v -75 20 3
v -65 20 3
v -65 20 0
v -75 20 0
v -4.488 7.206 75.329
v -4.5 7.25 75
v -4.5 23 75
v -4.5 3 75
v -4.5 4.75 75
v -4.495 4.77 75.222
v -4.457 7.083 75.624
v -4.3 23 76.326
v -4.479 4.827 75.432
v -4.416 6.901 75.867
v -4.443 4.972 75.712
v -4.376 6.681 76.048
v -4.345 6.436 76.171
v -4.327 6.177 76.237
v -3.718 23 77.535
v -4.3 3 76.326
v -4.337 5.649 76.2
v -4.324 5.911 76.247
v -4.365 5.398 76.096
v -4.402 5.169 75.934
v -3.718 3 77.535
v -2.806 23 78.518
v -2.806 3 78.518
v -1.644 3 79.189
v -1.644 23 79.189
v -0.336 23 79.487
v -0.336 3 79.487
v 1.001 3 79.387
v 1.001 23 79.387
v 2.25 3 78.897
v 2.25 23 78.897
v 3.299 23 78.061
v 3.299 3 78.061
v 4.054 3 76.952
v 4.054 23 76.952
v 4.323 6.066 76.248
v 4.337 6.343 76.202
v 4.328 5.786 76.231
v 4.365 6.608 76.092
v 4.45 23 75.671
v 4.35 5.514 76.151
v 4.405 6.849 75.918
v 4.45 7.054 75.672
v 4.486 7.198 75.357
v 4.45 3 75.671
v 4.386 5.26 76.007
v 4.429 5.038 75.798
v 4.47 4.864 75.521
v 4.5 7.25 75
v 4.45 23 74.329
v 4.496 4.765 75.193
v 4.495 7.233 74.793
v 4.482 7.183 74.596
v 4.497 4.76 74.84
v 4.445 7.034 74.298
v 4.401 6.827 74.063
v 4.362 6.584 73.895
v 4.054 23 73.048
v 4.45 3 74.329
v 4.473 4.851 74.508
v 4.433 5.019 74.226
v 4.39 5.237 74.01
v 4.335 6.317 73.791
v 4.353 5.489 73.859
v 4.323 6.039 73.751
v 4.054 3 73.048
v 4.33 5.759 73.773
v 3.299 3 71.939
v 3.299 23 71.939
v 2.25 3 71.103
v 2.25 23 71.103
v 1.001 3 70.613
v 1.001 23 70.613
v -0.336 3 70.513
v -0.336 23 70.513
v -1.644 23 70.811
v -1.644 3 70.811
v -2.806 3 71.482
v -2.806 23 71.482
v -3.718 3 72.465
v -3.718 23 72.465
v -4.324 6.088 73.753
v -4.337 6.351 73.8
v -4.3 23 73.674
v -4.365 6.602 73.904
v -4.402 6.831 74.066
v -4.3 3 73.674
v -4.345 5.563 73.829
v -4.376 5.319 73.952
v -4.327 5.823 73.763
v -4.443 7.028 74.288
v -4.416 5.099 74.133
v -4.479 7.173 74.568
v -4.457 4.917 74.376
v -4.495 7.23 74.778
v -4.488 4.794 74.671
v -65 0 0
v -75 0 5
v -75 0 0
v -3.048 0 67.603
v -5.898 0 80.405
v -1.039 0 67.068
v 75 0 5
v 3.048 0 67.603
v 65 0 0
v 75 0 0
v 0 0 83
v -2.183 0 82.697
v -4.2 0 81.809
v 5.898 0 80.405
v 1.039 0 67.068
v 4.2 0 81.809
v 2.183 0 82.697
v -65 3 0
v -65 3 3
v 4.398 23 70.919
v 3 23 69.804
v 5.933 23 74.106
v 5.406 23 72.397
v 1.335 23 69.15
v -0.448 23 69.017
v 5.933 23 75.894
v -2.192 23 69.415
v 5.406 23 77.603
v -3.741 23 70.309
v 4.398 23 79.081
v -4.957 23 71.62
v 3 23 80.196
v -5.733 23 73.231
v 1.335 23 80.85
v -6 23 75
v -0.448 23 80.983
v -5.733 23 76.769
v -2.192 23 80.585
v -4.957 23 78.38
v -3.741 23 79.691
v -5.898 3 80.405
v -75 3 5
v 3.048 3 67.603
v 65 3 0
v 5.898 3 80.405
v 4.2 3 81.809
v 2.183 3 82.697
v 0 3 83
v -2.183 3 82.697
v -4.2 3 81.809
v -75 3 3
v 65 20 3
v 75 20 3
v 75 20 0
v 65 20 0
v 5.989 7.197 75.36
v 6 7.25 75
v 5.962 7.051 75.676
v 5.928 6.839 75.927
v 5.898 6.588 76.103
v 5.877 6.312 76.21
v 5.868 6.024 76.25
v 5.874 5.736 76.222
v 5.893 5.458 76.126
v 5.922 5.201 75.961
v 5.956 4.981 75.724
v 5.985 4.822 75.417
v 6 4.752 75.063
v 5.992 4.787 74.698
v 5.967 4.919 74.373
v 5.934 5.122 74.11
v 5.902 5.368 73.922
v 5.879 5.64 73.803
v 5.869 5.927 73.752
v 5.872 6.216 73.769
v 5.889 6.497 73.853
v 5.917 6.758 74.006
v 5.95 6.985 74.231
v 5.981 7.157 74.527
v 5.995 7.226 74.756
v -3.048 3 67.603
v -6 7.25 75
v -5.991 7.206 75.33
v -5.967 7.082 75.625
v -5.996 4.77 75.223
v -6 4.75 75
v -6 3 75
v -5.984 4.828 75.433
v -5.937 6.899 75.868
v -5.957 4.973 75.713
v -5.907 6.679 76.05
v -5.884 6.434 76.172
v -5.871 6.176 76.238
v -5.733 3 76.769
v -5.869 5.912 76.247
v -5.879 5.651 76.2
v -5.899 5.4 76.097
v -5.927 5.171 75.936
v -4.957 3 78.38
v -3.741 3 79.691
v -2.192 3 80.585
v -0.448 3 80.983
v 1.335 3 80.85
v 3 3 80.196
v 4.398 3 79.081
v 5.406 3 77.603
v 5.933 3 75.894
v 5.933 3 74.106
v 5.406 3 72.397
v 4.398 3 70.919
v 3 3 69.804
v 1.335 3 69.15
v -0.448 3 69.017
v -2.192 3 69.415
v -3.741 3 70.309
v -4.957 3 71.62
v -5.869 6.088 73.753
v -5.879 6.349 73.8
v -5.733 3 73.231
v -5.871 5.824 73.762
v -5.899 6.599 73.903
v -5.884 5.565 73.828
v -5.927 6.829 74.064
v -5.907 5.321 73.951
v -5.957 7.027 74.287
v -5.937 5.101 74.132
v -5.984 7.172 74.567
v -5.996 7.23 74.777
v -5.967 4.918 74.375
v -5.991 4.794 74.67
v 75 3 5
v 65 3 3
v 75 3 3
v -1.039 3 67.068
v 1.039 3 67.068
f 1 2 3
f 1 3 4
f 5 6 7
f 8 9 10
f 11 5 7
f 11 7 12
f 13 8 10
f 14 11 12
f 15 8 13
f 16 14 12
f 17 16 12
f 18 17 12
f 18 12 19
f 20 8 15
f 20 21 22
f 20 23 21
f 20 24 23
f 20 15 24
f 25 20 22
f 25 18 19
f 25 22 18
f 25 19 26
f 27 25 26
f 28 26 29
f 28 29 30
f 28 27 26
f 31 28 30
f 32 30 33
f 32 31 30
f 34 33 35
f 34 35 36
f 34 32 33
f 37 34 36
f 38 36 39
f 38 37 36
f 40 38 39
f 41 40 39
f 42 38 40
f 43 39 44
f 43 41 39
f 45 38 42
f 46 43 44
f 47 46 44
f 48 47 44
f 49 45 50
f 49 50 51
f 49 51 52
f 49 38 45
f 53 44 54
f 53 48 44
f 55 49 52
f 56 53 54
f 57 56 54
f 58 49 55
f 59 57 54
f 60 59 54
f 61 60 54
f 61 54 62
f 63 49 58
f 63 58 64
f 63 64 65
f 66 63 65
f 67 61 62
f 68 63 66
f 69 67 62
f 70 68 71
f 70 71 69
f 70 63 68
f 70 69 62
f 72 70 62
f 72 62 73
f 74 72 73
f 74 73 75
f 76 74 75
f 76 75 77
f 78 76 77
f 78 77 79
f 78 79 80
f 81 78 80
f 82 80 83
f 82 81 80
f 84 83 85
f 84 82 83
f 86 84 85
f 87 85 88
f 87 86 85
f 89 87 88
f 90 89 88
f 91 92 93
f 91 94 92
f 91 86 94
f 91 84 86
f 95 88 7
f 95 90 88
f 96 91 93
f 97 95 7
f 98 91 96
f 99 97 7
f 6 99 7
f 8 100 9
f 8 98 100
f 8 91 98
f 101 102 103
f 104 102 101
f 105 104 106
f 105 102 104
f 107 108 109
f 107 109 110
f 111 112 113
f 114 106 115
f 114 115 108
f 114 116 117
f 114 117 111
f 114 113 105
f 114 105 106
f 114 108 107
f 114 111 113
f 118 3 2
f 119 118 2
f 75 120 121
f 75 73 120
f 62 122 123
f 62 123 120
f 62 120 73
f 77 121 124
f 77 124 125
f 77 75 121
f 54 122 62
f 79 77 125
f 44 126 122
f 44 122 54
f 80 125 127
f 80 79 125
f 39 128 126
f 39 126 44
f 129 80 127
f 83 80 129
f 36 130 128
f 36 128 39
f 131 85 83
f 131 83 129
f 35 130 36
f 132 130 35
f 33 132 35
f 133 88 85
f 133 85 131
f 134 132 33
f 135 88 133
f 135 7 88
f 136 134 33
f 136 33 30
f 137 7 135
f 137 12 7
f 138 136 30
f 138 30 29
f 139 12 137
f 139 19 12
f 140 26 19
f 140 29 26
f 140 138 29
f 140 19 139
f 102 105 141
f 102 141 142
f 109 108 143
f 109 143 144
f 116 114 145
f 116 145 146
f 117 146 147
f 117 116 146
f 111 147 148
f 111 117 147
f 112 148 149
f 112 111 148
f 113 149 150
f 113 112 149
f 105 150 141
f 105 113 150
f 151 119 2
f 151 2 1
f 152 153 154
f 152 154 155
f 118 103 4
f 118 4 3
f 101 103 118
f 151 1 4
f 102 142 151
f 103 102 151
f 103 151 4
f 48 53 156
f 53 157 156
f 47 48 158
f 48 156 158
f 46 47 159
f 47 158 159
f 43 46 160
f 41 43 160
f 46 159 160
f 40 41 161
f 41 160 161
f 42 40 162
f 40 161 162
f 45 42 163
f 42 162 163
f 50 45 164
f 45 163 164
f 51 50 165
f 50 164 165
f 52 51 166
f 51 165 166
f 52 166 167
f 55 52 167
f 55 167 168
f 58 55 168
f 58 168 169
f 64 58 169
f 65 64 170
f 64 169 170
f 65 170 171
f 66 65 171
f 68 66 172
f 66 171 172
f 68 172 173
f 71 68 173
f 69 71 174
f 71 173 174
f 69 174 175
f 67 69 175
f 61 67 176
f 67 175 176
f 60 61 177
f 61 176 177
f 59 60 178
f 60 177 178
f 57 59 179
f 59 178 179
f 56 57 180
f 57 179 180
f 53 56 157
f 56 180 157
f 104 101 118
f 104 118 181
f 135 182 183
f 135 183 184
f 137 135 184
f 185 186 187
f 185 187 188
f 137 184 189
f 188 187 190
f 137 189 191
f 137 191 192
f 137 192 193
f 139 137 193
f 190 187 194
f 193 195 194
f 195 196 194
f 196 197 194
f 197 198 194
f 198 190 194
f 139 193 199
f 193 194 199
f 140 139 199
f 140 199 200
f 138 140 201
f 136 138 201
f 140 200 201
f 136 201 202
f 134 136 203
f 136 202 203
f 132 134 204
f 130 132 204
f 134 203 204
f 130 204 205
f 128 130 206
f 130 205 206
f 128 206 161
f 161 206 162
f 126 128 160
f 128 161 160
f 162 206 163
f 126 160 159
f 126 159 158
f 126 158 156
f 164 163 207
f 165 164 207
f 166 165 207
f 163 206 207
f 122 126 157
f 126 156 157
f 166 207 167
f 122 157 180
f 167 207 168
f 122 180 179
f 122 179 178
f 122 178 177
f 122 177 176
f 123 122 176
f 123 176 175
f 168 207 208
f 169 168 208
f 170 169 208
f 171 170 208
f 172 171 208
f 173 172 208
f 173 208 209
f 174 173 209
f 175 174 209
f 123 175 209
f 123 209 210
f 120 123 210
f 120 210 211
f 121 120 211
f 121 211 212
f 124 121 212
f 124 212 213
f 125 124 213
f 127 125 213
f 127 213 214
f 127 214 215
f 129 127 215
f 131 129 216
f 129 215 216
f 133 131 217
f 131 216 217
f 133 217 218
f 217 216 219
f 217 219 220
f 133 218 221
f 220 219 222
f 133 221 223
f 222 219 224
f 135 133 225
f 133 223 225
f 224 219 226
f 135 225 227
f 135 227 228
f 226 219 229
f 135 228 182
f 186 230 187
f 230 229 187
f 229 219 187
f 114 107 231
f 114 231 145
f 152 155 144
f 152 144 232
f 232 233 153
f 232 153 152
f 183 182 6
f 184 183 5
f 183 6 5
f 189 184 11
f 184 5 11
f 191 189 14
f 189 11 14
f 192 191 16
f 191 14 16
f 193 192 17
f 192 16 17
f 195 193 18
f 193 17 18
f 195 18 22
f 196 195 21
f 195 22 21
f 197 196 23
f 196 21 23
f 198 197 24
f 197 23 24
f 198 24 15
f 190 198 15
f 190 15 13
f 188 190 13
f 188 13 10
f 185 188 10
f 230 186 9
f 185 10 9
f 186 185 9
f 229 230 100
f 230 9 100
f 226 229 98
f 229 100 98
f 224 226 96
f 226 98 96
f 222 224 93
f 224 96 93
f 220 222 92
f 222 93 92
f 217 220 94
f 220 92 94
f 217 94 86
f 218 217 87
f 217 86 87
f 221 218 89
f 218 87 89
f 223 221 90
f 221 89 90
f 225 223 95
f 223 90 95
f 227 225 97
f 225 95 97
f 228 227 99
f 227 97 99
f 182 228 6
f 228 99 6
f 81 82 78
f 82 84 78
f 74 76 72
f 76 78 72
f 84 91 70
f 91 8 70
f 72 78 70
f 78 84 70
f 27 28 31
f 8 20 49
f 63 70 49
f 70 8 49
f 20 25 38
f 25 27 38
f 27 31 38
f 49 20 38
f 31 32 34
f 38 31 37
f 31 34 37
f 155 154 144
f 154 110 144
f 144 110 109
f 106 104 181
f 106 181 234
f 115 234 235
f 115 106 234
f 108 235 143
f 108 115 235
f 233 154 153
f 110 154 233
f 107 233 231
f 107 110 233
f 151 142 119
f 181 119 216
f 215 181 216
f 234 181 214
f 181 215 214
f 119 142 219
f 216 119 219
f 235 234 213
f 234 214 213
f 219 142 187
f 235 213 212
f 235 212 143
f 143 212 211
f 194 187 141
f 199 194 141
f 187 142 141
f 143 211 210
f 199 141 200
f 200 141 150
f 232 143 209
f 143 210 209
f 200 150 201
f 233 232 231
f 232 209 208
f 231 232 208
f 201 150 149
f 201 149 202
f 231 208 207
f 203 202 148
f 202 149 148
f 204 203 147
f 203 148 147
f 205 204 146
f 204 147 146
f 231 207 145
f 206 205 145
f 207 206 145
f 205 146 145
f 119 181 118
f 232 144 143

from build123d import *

# Parameters (mm, degrees)
F1_DEPTH = 3
F2_R     = 6
F2_R_2   = 4.5
F3_DEPTH = 20
F4_W     = 10
F4_H     = 3
F5_DEPTH = 17
F6_R     = 1.25
F7_DEPTH = 12.5


with BuildPart() as f1:
    # F0 (on Front) → F1 (new body)
    with BuildSketch(Plane.XZ):
        with BuildLine():
            Line((-75, 5), (-75, 0))
            Line((-75, 0), (-65, 0))
            Line((-65, 0), (-3.0475954437, 67.6032330027))
            ThreePointArc((-3.0475954437, 67.6032330027), (0, 67), (3.0475954437, 67.6032330027))
            Line((3.0475954437, 67.6032330027), (65, 0))
            Line((65, 0), (75, 0))
            Line((75, 0), (75, 5))
            Line((75, 5), (5.8979816495, 80.4049803387))
            ThreePointArc((5.8979816495, 80.4049803387), (0, 83), (-5.8979816495, 80.4049803387))
            Line((-5.8979816495, 80.4049803387), (-75, 5))
        make_face()
    extrude(amount=-F1_DEPTH)

    # F2 (on face) → F3 (join)
    with BuildSketch(Plane(origin=(0, 3, 0), x_dir=(-1, 0, 0), z_dir=(0, 1, 0))):
        with Locations((0, 75)):
            Circle(F2_R)
        with Locations((0, 75)):
            Circle(F2_R_2, mode=Mode.SUBTRACT)
    extrude(amount=F3_DEPTH)

    # F4 (on face) → F5 (join)
    with BuildSketch(Plane(origin=(0, 3, 0), x_dir=(-1, 0, 0), z_dir=(0, 1, 0))):
        with Locations((-70, 1.5)):
            Rectangle(F4_W, F4_H)
        with Locations((70, 1.5)):
            Rectangle(F4_W, F4_H)
    extrude(amount=F5_DEPTH)

    # F6 (on Right) → F7 (cut, symmetric)
    with BuildSketch(Plane.YZ):
        with Locations((6, 75)):
            Circle(F6_R)
    extrude(amount=F7_DEPTH, both=True, mode=Mode.SUBTRACT)


solid = f1.part
